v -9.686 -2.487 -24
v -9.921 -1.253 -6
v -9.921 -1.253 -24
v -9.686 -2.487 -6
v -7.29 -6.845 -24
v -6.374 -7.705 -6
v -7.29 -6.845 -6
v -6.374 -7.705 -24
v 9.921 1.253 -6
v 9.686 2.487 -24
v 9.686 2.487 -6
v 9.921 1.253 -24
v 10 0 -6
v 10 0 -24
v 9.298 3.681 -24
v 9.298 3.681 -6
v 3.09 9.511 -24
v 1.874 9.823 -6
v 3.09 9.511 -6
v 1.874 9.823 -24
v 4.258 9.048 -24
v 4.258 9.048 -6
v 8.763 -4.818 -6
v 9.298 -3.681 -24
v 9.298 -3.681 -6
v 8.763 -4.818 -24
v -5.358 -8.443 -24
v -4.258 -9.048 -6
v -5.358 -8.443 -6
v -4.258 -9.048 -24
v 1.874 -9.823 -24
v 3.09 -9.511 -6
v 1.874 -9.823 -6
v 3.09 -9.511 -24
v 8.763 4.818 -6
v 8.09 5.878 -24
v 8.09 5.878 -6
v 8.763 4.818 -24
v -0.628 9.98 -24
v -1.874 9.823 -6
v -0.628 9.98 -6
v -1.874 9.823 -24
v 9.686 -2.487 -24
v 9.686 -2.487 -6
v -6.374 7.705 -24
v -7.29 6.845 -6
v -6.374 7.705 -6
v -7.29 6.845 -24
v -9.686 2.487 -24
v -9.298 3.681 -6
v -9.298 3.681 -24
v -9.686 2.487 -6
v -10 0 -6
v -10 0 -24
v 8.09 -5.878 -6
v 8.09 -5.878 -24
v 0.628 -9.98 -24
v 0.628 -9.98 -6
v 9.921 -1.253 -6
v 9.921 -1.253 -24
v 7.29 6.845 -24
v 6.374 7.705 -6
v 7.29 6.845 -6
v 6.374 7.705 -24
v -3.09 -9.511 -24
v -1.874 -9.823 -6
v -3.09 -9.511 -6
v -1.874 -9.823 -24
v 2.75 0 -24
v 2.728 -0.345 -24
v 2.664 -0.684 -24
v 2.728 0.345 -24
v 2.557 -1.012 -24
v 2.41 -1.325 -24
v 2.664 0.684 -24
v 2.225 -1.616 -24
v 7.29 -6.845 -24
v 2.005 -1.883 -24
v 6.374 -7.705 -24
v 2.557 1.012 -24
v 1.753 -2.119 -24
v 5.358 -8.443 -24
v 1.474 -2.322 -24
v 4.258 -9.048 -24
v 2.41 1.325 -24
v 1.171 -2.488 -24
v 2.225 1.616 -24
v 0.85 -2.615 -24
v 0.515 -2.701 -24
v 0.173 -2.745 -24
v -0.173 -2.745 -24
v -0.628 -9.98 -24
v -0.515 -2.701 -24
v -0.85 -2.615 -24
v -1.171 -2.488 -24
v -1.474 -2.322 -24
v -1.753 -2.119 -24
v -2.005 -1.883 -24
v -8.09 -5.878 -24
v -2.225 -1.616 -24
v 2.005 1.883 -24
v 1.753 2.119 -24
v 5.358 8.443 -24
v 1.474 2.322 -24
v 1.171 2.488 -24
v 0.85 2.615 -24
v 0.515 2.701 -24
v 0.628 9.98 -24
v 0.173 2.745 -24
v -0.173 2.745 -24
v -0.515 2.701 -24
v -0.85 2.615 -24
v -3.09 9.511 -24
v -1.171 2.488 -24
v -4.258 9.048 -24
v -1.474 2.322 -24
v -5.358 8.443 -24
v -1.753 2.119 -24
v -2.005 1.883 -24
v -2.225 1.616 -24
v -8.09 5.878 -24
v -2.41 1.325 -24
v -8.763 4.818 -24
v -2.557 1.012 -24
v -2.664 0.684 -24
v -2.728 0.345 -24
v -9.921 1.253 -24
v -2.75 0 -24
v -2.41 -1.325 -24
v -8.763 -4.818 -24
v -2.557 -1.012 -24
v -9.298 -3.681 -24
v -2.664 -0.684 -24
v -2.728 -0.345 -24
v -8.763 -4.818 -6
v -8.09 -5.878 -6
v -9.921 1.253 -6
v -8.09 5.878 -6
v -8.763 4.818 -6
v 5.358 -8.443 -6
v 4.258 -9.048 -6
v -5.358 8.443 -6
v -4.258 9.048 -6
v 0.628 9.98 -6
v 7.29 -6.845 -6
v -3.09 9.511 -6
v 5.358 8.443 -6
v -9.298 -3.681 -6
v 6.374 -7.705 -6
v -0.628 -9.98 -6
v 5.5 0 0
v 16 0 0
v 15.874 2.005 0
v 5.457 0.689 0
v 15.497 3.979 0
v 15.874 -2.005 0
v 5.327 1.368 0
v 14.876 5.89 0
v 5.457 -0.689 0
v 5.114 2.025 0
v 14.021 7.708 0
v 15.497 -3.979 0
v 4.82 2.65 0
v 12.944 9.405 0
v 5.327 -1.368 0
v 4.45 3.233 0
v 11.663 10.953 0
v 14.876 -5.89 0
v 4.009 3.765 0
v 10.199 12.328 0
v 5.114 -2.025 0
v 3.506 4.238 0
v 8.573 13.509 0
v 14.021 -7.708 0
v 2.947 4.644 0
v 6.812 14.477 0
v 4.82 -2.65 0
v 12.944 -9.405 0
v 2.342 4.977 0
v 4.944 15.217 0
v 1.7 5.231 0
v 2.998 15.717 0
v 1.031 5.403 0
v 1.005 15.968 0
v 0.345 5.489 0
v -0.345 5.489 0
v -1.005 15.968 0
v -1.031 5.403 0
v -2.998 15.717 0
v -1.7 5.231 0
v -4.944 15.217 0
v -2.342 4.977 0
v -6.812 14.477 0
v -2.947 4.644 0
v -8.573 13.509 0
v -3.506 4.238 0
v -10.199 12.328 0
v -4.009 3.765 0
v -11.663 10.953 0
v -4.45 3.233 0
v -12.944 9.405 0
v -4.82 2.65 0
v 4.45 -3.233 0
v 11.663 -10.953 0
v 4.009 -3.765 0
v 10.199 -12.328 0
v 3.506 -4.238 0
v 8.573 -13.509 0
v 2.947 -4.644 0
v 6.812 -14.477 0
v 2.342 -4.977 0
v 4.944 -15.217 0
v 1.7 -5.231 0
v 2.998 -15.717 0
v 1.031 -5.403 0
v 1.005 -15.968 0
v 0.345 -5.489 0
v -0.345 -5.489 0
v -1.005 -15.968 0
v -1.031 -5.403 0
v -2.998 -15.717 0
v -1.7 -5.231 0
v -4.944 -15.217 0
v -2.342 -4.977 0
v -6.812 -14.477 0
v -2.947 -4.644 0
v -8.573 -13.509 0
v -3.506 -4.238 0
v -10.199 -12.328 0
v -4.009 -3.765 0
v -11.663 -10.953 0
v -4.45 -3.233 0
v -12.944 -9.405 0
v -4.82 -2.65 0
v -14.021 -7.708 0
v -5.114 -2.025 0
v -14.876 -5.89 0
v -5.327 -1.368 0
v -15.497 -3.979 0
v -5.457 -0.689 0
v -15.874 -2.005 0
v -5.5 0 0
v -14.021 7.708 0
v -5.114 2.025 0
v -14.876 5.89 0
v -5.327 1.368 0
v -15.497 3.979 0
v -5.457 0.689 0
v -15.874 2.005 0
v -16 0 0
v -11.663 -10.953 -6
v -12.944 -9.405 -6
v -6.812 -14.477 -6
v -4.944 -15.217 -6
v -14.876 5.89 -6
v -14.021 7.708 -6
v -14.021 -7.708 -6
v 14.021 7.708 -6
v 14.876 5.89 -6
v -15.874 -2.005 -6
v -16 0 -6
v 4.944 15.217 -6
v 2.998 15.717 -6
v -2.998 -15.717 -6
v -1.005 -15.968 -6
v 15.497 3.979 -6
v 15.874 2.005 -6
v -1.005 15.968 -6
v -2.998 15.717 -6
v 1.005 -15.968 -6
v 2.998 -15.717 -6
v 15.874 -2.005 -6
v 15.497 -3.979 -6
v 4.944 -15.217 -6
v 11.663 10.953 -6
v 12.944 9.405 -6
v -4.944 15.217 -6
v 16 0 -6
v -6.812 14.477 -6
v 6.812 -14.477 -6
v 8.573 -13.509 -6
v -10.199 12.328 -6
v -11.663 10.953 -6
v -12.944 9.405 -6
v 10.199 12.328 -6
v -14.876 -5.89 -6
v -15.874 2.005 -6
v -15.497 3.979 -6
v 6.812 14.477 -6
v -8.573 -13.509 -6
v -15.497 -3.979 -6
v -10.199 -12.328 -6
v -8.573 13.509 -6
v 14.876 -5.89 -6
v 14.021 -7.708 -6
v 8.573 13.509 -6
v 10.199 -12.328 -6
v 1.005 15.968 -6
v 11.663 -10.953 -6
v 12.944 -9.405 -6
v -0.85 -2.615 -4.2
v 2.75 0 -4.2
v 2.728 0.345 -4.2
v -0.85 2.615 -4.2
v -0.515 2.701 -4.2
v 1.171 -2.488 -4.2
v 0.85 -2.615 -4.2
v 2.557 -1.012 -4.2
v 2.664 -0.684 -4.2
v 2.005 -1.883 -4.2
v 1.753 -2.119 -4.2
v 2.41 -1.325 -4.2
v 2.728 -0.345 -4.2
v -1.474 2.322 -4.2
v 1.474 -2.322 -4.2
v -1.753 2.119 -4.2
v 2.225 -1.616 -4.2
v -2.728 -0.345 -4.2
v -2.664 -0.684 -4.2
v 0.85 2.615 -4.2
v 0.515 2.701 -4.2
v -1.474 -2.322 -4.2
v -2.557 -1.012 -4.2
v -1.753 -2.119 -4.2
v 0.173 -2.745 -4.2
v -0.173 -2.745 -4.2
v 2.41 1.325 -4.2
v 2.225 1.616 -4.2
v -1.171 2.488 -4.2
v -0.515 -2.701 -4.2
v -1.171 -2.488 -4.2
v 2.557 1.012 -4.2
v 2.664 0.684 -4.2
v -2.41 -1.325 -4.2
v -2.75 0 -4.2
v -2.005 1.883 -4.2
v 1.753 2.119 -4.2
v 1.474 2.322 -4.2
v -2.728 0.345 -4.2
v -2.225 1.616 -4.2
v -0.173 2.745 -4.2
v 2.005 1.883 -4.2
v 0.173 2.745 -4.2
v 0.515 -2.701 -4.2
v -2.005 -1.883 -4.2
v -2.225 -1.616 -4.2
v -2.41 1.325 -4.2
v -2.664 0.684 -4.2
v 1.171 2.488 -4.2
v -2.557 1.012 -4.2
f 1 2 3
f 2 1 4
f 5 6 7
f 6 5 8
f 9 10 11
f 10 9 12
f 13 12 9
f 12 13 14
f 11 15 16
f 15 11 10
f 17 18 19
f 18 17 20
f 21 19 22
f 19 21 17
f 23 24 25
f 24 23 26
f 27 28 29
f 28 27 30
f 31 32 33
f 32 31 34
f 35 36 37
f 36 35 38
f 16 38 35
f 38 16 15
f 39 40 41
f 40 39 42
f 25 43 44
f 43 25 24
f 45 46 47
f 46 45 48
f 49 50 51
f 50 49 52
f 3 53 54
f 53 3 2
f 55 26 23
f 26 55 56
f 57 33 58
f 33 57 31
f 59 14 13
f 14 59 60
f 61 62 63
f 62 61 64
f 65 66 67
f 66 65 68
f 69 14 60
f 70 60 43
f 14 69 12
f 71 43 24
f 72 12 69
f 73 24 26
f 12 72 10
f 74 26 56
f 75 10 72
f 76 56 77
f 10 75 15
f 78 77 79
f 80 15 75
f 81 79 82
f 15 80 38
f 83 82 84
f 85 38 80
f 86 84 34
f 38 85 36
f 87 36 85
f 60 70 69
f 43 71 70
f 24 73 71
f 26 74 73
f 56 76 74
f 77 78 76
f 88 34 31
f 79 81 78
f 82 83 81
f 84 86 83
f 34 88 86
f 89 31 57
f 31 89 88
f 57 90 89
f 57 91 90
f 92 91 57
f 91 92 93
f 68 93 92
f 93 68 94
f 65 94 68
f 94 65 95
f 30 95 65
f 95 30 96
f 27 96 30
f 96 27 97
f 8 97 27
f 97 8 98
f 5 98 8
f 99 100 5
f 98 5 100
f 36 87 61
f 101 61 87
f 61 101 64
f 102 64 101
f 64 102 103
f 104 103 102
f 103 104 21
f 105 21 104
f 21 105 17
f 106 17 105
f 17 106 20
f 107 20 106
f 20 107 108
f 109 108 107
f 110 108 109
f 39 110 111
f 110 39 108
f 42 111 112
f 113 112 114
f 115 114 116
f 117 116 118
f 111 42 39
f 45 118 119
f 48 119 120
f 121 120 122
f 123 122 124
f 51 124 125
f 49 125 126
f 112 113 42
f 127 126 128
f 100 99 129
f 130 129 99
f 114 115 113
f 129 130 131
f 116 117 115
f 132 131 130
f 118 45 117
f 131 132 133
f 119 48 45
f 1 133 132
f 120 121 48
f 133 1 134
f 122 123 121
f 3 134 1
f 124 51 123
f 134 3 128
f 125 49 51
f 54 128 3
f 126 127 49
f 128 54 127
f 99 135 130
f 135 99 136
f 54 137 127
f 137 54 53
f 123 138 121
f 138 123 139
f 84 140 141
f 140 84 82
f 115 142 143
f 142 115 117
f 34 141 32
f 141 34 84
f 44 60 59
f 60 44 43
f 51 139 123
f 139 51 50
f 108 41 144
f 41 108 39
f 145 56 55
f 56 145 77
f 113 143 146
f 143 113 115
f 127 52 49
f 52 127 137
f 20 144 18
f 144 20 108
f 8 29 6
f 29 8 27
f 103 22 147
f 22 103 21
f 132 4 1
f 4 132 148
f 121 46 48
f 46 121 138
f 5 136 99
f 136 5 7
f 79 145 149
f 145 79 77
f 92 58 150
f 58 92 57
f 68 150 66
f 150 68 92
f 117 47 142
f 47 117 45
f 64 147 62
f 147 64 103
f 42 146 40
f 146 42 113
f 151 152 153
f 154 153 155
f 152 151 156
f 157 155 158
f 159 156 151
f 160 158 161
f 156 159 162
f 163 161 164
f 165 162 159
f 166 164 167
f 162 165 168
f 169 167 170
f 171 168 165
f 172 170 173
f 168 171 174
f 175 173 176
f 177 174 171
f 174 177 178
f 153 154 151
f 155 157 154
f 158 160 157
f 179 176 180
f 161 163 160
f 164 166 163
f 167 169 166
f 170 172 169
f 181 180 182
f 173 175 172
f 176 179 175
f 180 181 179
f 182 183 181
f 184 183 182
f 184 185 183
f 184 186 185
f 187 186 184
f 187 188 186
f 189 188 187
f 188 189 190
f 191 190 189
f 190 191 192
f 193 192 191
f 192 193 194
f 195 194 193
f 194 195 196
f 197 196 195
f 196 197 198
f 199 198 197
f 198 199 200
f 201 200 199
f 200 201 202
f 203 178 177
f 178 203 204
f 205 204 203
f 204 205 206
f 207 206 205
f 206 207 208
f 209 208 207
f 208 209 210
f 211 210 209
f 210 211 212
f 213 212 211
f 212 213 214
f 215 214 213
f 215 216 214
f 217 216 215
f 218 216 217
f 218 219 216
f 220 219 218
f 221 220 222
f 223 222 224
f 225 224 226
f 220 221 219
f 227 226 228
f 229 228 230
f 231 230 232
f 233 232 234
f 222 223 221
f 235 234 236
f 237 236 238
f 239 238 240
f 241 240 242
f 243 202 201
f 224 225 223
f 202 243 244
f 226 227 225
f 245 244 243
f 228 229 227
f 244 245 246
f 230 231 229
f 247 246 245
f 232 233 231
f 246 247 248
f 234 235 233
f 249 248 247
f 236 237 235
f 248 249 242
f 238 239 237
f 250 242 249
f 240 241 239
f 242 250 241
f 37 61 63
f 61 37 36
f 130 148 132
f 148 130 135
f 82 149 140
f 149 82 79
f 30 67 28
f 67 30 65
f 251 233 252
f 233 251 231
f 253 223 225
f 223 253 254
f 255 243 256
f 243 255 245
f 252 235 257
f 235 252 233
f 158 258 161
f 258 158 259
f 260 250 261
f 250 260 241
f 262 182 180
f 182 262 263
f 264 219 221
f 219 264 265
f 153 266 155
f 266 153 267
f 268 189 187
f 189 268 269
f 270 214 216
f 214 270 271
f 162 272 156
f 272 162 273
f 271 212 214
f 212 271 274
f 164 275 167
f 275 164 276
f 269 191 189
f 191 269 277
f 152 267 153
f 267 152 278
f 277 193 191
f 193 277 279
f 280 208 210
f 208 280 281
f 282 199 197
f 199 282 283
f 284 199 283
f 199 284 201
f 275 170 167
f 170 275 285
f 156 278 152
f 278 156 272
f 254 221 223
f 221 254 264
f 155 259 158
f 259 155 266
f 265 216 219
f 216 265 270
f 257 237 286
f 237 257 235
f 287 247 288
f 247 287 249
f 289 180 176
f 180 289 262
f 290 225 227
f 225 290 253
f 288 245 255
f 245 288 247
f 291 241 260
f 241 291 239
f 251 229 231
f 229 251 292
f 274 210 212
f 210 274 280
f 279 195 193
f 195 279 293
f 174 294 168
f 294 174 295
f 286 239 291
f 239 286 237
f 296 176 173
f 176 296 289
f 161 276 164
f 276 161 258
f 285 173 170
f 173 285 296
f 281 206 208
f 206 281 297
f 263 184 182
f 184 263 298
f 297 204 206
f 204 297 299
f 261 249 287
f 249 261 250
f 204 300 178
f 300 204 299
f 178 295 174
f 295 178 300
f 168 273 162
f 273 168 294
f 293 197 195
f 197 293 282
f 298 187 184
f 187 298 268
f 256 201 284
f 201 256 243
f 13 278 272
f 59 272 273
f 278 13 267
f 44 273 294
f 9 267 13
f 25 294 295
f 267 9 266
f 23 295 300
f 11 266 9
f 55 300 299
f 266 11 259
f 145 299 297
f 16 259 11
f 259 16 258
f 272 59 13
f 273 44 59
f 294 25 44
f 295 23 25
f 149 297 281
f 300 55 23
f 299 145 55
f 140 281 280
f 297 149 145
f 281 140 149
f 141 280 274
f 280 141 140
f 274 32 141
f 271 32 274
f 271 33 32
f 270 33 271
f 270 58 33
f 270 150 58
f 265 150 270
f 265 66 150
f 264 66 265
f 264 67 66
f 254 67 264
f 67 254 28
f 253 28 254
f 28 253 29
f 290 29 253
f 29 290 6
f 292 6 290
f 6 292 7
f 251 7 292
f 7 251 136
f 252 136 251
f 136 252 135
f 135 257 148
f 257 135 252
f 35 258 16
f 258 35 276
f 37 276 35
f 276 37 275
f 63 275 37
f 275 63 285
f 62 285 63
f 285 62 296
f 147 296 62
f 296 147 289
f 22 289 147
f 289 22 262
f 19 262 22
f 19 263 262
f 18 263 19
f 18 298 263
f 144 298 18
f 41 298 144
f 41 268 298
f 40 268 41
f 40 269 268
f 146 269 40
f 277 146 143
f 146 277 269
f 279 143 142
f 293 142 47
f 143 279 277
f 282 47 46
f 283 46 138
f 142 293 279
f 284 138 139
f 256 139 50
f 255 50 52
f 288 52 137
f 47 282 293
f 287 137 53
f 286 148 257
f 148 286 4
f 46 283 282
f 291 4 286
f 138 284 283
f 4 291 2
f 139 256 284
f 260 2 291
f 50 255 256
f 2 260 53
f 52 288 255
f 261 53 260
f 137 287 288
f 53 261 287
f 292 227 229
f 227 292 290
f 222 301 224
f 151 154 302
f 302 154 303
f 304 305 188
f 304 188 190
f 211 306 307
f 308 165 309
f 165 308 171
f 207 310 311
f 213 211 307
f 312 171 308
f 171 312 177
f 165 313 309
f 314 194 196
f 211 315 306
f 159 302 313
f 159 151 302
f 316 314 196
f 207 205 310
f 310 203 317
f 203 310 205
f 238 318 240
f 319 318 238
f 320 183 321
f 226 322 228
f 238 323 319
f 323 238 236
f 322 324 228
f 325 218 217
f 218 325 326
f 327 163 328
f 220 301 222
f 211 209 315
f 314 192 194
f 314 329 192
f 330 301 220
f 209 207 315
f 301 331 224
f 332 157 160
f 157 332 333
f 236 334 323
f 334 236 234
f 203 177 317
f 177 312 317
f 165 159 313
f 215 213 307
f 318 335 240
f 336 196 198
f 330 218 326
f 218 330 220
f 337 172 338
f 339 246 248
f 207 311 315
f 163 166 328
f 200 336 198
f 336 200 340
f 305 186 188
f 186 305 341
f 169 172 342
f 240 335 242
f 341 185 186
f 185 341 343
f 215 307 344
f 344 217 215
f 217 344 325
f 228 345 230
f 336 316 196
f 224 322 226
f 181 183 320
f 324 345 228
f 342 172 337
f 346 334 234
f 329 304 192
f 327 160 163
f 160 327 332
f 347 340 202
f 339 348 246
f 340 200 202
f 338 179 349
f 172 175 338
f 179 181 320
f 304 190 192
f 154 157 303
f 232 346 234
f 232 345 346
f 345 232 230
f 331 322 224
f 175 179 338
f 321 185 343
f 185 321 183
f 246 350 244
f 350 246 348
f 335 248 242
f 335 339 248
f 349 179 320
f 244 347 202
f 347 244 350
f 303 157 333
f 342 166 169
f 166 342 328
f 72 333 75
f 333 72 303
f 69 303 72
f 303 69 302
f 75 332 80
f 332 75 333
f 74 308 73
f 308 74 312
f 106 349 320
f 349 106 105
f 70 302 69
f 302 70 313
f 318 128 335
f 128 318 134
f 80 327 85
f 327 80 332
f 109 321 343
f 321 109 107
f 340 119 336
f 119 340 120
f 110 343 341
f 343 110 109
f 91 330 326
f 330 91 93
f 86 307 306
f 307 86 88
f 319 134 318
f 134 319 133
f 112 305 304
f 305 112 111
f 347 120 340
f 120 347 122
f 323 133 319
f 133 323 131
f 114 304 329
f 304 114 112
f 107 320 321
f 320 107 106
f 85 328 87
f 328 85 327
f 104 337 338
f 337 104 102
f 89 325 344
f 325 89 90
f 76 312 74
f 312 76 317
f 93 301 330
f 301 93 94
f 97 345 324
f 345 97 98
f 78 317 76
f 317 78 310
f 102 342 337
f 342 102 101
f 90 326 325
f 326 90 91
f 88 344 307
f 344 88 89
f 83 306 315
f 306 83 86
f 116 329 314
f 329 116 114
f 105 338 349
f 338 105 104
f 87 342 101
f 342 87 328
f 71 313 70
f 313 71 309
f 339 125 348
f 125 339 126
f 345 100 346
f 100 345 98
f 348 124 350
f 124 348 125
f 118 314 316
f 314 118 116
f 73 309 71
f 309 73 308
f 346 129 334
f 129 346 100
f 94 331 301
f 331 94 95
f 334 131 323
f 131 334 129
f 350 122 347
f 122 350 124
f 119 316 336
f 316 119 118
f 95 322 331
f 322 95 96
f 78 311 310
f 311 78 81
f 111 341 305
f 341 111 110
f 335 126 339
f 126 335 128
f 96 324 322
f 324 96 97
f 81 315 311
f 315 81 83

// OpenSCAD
$fn = 50;


difference() {
	union() {
		translate(v = [0, 0, -24.0000000000]) {
			cylinder(h = 24, r = 10.0000000000);
		}
		translate(v = [0, 0, -6.0000000000]) {
			cylinder(h = 6, r = 16.0000000000);
		}
	}
	union() {
		translate(v = [0, 0, 0]) {
			rotate(a = [0, 0, 0]) {
				difference() {
					union() {
						#translate(v = [0, 0, -24.0000000000]) {
							cylinder(h = 24, r = 2.2500000000);
						}
						#translate(v = [0, 0, -4.2000000000]) {
							cylinder(h = 4.2000000000, r1 = 2.7500000000, r2 = 5.5000000000);
						}
						#translate(v = [0, 0, -24.0000000000]) {
							cylinder(h = 24, r = 2.7500000000);
						}
						#translate(v = [0, 0, -24.0000000000]) {
							cylinder(h = 24, r = 2.2500000000);
						}
					}
					union();
				}
			}
		}
	}
}
